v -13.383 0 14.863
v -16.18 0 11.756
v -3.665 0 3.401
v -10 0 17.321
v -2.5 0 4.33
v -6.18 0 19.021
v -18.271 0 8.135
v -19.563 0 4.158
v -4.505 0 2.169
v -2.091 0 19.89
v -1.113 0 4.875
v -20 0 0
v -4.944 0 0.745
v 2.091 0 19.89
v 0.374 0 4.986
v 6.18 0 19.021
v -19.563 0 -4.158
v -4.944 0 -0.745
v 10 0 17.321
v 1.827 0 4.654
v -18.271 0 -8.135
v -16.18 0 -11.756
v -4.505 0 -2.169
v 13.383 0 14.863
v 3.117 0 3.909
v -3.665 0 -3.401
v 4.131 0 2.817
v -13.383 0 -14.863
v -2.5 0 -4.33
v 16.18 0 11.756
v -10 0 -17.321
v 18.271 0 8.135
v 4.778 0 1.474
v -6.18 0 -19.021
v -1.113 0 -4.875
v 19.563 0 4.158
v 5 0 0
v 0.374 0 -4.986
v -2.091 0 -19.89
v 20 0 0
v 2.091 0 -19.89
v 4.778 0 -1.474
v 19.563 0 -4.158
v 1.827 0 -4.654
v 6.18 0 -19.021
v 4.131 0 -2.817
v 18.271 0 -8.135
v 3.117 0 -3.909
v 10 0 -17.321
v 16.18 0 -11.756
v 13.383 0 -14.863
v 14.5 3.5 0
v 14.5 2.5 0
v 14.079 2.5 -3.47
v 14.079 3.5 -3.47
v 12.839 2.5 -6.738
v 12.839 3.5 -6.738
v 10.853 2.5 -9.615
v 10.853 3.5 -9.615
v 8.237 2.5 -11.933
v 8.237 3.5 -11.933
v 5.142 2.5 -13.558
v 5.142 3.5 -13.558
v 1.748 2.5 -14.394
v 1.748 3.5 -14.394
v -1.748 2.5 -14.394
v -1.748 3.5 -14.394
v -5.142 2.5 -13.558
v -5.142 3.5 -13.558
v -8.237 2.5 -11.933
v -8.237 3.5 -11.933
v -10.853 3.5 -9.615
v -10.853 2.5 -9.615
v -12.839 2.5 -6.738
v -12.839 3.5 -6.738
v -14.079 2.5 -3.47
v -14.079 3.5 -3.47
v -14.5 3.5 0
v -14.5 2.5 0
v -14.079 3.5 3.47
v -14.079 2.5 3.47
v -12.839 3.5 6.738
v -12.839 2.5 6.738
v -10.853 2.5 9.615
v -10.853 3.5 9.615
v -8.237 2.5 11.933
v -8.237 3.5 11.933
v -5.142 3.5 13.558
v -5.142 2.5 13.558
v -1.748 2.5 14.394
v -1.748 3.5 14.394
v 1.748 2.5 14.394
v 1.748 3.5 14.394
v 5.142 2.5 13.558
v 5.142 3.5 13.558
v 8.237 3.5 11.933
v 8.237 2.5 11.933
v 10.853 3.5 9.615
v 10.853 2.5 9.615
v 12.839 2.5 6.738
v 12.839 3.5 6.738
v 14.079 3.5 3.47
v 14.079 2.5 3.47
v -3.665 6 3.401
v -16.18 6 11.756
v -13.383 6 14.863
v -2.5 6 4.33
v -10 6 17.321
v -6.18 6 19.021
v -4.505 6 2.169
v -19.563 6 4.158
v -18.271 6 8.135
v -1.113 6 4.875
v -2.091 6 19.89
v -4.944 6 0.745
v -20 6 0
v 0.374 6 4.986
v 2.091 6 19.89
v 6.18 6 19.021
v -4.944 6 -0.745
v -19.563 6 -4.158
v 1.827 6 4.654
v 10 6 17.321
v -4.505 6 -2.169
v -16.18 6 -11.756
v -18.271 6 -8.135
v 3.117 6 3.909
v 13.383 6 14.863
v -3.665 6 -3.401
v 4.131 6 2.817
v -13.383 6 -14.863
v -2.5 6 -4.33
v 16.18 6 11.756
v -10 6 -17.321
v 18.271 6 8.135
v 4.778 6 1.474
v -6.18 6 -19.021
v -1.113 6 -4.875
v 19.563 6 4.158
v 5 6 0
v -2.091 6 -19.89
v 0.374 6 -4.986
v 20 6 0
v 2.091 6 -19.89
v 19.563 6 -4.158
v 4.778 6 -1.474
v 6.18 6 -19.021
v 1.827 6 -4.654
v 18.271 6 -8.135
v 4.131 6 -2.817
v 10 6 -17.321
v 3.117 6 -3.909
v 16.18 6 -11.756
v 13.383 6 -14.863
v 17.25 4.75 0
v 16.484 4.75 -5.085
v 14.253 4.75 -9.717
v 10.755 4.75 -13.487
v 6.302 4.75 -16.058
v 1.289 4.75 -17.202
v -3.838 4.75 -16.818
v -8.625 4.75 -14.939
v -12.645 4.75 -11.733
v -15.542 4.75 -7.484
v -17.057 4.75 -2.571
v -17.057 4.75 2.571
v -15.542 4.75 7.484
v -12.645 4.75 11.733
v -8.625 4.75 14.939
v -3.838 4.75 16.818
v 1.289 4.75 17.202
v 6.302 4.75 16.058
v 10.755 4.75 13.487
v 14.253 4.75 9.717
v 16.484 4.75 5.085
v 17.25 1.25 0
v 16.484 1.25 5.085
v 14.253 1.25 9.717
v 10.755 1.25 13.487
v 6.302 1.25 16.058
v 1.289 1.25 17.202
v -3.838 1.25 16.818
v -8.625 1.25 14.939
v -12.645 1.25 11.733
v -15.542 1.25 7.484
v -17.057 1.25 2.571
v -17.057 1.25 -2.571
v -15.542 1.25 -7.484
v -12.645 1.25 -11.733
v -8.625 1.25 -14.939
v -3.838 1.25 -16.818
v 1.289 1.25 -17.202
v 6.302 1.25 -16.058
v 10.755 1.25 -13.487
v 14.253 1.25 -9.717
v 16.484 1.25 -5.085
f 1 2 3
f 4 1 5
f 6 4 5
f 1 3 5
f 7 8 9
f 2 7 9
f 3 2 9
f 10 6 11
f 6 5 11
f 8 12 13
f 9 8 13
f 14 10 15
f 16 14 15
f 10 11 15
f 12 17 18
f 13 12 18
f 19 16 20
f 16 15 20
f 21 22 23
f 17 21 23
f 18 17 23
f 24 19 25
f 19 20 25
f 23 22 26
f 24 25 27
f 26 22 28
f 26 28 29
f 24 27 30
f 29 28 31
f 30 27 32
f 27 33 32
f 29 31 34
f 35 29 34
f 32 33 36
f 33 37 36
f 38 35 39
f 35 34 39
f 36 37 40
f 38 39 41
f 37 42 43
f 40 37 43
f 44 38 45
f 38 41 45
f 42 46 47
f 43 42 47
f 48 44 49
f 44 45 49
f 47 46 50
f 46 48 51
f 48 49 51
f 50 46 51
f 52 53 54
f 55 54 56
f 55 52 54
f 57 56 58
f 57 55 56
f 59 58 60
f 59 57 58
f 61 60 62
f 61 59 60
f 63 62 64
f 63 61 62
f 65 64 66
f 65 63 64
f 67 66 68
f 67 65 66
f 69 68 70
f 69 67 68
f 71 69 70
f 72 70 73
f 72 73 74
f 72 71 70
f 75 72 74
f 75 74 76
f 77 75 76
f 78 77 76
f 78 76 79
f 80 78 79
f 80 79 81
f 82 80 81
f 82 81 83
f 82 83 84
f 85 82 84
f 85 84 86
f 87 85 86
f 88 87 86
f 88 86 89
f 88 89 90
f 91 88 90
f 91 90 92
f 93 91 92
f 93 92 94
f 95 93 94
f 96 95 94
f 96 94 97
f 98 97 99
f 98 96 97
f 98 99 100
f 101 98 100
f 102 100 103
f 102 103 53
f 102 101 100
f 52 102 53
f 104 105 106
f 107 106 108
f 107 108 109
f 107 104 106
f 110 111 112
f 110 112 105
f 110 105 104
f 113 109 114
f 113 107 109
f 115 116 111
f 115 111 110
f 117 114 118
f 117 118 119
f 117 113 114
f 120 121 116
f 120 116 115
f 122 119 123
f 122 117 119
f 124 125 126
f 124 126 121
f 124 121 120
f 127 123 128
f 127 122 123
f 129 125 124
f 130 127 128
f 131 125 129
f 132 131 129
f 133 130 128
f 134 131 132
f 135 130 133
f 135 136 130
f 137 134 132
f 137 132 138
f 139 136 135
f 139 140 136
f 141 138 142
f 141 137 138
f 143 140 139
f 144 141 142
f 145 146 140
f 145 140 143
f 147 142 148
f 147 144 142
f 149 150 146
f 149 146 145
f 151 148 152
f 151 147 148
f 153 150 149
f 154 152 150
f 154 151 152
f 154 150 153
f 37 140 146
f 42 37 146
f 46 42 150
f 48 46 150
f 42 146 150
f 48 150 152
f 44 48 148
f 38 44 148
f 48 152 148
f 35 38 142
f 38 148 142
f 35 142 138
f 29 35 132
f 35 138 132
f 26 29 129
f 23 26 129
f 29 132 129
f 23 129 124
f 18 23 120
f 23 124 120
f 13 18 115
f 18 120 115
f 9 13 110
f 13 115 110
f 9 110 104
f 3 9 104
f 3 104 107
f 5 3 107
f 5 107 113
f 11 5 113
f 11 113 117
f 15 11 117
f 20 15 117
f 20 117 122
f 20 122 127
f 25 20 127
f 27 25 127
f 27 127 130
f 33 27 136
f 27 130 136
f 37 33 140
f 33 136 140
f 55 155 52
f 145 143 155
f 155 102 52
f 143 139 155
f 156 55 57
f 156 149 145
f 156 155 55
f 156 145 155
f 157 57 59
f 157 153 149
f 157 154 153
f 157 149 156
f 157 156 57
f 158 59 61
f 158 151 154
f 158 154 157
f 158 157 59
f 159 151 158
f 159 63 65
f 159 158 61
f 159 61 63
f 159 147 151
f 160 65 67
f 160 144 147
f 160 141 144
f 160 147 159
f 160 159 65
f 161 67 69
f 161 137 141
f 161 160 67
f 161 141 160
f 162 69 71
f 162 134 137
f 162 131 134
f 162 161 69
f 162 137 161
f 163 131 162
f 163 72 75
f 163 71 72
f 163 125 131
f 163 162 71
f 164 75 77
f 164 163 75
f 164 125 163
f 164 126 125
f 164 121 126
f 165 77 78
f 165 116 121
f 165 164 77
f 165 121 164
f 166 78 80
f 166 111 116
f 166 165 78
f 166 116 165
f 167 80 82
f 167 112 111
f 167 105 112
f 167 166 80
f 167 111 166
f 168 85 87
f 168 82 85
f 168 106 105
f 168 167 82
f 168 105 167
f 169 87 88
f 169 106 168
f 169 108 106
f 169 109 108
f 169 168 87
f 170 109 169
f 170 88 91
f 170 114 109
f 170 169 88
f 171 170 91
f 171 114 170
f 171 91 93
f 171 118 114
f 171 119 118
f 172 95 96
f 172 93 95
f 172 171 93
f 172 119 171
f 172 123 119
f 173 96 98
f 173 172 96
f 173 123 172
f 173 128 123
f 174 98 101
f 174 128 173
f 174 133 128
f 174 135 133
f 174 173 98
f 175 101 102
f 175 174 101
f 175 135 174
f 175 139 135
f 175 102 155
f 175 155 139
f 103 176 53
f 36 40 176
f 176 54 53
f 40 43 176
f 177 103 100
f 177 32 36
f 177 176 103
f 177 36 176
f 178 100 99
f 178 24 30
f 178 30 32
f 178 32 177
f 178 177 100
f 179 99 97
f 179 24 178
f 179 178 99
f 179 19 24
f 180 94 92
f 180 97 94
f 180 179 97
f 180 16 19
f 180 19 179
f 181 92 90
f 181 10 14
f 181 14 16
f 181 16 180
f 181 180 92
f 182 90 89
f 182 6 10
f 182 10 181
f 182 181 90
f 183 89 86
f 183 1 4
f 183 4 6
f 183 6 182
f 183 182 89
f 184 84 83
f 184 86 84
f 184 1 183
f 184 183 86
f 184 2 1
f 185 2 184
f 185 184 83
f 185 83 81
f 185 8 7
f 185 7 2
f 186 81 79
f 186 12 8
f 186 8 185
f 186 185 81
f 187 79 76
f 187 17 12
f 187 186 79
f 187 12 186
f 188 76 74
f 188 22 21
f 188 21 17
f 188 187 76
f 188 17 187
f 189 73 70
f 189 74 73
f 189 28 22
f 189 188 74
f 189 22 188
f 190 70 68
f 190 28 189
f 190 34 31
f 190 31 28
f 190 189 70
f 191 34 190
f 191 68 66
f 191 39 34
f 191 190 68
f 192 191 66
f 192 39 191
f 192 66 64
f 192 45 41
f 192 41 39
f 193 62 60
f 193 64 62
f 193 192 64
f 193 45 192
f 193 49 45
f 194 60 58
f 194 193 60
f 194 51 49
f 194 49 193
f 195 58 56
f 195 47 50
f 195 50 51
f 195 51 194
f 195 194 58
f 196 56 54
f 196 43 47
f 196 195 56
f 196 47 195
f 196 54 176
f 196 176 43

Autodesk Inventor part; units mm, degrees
ref_plane "YZ Plane" through (0, 0, 0) normal (1, 0, 0) x (0, 1, 0)
ref_plane "XZ Plane" through (0, 0, 0) normal (0, 1, 0) x (-1, 0, 0)
ref_plane "XY Plane" through (0, 0, 0) normal (0, 0, 1) x (1, 0, 0)
sketch "Esquisse1" plane through (0, 0, 0) normal (0, 0, 1) x (1, 0, 0)
  point P0 (0, 0)
sketch "Esquisse2" plane through (0, 0, 0) normal (0, 0, 1) x (1, 0, 0)
  line L0 (0, 2.5) -> (14.5, 2.5)
  line L1 (14.5, 2.5) -> (20, 0)
  line L2 (20, 0) -> (0, 0)
  line L3 (0, 0) -> (0, 2.5)
  dimension "d0" = 20
  dimension "d1" = 14.5
  dimension "d2" = 2.5
revolve "Révolution1" add sketch "Esquisse2" angle 360 about axis through (0, 0, 0) along (0, 1, 0)
sketch "Esquisse3" plane through (0, 0, 0) normal (0, 0, 1) x (1, 0, 0)
  line L0 (-14.5, 2.5) -> (14.5, 2.5) projected
  line L1 (0, 2.5) -> (14.5, 2.5)
  line L2 (14.5, 2.5) -> (14.5, 3.5)
  line L3 (14.5, 3.5) -> (0, 3.5)
  line L4 (0, 3.5) -> (0, 2.5)
  point P0 (0, 0)
  dimension "d4" = 1
  dimension "d5" = 14.5
revolve "Révolution2" add sketch "Esquisse3" angle 360 about axis through (0, 3.5, 0) along (0, -1, 0)
sketch "Esquisse4" plane through (0, 0, 0) normal (0, 0, 1) x (1, 0, 0)
  line L0 (-14.5, 3.5) -> (14.5, 3.5) projected
  line L1 (0, 3.5) -> (0, 6)
  line L2 (0, 6) -> (20, 6)
  line L3 (20, 6) -> (14.5, 3.5)
  line L4 (14.5, 3.5) -> (0, 3.5)
  point P0 (0, 0)
  dimension "d7" = 20
  dimension "d8" = 2.5
revolve "Révolution3" add sketch "Esquisse4" angle 360 about axis through (0, 3.5, 0) along (0, 1, 0)
sketch "Esquisse5" plane through (0, 6, 0) normal (0, 1, 0) x (1, 0, 0)
  circle A0 centre (0, 0) radius 5
  dimension "d10" = 10
extrude "Extrusion1" cut sketch "Esquisse5" against normal blind 6
properties part number "Wrist polley" material "Plastique ABS"
